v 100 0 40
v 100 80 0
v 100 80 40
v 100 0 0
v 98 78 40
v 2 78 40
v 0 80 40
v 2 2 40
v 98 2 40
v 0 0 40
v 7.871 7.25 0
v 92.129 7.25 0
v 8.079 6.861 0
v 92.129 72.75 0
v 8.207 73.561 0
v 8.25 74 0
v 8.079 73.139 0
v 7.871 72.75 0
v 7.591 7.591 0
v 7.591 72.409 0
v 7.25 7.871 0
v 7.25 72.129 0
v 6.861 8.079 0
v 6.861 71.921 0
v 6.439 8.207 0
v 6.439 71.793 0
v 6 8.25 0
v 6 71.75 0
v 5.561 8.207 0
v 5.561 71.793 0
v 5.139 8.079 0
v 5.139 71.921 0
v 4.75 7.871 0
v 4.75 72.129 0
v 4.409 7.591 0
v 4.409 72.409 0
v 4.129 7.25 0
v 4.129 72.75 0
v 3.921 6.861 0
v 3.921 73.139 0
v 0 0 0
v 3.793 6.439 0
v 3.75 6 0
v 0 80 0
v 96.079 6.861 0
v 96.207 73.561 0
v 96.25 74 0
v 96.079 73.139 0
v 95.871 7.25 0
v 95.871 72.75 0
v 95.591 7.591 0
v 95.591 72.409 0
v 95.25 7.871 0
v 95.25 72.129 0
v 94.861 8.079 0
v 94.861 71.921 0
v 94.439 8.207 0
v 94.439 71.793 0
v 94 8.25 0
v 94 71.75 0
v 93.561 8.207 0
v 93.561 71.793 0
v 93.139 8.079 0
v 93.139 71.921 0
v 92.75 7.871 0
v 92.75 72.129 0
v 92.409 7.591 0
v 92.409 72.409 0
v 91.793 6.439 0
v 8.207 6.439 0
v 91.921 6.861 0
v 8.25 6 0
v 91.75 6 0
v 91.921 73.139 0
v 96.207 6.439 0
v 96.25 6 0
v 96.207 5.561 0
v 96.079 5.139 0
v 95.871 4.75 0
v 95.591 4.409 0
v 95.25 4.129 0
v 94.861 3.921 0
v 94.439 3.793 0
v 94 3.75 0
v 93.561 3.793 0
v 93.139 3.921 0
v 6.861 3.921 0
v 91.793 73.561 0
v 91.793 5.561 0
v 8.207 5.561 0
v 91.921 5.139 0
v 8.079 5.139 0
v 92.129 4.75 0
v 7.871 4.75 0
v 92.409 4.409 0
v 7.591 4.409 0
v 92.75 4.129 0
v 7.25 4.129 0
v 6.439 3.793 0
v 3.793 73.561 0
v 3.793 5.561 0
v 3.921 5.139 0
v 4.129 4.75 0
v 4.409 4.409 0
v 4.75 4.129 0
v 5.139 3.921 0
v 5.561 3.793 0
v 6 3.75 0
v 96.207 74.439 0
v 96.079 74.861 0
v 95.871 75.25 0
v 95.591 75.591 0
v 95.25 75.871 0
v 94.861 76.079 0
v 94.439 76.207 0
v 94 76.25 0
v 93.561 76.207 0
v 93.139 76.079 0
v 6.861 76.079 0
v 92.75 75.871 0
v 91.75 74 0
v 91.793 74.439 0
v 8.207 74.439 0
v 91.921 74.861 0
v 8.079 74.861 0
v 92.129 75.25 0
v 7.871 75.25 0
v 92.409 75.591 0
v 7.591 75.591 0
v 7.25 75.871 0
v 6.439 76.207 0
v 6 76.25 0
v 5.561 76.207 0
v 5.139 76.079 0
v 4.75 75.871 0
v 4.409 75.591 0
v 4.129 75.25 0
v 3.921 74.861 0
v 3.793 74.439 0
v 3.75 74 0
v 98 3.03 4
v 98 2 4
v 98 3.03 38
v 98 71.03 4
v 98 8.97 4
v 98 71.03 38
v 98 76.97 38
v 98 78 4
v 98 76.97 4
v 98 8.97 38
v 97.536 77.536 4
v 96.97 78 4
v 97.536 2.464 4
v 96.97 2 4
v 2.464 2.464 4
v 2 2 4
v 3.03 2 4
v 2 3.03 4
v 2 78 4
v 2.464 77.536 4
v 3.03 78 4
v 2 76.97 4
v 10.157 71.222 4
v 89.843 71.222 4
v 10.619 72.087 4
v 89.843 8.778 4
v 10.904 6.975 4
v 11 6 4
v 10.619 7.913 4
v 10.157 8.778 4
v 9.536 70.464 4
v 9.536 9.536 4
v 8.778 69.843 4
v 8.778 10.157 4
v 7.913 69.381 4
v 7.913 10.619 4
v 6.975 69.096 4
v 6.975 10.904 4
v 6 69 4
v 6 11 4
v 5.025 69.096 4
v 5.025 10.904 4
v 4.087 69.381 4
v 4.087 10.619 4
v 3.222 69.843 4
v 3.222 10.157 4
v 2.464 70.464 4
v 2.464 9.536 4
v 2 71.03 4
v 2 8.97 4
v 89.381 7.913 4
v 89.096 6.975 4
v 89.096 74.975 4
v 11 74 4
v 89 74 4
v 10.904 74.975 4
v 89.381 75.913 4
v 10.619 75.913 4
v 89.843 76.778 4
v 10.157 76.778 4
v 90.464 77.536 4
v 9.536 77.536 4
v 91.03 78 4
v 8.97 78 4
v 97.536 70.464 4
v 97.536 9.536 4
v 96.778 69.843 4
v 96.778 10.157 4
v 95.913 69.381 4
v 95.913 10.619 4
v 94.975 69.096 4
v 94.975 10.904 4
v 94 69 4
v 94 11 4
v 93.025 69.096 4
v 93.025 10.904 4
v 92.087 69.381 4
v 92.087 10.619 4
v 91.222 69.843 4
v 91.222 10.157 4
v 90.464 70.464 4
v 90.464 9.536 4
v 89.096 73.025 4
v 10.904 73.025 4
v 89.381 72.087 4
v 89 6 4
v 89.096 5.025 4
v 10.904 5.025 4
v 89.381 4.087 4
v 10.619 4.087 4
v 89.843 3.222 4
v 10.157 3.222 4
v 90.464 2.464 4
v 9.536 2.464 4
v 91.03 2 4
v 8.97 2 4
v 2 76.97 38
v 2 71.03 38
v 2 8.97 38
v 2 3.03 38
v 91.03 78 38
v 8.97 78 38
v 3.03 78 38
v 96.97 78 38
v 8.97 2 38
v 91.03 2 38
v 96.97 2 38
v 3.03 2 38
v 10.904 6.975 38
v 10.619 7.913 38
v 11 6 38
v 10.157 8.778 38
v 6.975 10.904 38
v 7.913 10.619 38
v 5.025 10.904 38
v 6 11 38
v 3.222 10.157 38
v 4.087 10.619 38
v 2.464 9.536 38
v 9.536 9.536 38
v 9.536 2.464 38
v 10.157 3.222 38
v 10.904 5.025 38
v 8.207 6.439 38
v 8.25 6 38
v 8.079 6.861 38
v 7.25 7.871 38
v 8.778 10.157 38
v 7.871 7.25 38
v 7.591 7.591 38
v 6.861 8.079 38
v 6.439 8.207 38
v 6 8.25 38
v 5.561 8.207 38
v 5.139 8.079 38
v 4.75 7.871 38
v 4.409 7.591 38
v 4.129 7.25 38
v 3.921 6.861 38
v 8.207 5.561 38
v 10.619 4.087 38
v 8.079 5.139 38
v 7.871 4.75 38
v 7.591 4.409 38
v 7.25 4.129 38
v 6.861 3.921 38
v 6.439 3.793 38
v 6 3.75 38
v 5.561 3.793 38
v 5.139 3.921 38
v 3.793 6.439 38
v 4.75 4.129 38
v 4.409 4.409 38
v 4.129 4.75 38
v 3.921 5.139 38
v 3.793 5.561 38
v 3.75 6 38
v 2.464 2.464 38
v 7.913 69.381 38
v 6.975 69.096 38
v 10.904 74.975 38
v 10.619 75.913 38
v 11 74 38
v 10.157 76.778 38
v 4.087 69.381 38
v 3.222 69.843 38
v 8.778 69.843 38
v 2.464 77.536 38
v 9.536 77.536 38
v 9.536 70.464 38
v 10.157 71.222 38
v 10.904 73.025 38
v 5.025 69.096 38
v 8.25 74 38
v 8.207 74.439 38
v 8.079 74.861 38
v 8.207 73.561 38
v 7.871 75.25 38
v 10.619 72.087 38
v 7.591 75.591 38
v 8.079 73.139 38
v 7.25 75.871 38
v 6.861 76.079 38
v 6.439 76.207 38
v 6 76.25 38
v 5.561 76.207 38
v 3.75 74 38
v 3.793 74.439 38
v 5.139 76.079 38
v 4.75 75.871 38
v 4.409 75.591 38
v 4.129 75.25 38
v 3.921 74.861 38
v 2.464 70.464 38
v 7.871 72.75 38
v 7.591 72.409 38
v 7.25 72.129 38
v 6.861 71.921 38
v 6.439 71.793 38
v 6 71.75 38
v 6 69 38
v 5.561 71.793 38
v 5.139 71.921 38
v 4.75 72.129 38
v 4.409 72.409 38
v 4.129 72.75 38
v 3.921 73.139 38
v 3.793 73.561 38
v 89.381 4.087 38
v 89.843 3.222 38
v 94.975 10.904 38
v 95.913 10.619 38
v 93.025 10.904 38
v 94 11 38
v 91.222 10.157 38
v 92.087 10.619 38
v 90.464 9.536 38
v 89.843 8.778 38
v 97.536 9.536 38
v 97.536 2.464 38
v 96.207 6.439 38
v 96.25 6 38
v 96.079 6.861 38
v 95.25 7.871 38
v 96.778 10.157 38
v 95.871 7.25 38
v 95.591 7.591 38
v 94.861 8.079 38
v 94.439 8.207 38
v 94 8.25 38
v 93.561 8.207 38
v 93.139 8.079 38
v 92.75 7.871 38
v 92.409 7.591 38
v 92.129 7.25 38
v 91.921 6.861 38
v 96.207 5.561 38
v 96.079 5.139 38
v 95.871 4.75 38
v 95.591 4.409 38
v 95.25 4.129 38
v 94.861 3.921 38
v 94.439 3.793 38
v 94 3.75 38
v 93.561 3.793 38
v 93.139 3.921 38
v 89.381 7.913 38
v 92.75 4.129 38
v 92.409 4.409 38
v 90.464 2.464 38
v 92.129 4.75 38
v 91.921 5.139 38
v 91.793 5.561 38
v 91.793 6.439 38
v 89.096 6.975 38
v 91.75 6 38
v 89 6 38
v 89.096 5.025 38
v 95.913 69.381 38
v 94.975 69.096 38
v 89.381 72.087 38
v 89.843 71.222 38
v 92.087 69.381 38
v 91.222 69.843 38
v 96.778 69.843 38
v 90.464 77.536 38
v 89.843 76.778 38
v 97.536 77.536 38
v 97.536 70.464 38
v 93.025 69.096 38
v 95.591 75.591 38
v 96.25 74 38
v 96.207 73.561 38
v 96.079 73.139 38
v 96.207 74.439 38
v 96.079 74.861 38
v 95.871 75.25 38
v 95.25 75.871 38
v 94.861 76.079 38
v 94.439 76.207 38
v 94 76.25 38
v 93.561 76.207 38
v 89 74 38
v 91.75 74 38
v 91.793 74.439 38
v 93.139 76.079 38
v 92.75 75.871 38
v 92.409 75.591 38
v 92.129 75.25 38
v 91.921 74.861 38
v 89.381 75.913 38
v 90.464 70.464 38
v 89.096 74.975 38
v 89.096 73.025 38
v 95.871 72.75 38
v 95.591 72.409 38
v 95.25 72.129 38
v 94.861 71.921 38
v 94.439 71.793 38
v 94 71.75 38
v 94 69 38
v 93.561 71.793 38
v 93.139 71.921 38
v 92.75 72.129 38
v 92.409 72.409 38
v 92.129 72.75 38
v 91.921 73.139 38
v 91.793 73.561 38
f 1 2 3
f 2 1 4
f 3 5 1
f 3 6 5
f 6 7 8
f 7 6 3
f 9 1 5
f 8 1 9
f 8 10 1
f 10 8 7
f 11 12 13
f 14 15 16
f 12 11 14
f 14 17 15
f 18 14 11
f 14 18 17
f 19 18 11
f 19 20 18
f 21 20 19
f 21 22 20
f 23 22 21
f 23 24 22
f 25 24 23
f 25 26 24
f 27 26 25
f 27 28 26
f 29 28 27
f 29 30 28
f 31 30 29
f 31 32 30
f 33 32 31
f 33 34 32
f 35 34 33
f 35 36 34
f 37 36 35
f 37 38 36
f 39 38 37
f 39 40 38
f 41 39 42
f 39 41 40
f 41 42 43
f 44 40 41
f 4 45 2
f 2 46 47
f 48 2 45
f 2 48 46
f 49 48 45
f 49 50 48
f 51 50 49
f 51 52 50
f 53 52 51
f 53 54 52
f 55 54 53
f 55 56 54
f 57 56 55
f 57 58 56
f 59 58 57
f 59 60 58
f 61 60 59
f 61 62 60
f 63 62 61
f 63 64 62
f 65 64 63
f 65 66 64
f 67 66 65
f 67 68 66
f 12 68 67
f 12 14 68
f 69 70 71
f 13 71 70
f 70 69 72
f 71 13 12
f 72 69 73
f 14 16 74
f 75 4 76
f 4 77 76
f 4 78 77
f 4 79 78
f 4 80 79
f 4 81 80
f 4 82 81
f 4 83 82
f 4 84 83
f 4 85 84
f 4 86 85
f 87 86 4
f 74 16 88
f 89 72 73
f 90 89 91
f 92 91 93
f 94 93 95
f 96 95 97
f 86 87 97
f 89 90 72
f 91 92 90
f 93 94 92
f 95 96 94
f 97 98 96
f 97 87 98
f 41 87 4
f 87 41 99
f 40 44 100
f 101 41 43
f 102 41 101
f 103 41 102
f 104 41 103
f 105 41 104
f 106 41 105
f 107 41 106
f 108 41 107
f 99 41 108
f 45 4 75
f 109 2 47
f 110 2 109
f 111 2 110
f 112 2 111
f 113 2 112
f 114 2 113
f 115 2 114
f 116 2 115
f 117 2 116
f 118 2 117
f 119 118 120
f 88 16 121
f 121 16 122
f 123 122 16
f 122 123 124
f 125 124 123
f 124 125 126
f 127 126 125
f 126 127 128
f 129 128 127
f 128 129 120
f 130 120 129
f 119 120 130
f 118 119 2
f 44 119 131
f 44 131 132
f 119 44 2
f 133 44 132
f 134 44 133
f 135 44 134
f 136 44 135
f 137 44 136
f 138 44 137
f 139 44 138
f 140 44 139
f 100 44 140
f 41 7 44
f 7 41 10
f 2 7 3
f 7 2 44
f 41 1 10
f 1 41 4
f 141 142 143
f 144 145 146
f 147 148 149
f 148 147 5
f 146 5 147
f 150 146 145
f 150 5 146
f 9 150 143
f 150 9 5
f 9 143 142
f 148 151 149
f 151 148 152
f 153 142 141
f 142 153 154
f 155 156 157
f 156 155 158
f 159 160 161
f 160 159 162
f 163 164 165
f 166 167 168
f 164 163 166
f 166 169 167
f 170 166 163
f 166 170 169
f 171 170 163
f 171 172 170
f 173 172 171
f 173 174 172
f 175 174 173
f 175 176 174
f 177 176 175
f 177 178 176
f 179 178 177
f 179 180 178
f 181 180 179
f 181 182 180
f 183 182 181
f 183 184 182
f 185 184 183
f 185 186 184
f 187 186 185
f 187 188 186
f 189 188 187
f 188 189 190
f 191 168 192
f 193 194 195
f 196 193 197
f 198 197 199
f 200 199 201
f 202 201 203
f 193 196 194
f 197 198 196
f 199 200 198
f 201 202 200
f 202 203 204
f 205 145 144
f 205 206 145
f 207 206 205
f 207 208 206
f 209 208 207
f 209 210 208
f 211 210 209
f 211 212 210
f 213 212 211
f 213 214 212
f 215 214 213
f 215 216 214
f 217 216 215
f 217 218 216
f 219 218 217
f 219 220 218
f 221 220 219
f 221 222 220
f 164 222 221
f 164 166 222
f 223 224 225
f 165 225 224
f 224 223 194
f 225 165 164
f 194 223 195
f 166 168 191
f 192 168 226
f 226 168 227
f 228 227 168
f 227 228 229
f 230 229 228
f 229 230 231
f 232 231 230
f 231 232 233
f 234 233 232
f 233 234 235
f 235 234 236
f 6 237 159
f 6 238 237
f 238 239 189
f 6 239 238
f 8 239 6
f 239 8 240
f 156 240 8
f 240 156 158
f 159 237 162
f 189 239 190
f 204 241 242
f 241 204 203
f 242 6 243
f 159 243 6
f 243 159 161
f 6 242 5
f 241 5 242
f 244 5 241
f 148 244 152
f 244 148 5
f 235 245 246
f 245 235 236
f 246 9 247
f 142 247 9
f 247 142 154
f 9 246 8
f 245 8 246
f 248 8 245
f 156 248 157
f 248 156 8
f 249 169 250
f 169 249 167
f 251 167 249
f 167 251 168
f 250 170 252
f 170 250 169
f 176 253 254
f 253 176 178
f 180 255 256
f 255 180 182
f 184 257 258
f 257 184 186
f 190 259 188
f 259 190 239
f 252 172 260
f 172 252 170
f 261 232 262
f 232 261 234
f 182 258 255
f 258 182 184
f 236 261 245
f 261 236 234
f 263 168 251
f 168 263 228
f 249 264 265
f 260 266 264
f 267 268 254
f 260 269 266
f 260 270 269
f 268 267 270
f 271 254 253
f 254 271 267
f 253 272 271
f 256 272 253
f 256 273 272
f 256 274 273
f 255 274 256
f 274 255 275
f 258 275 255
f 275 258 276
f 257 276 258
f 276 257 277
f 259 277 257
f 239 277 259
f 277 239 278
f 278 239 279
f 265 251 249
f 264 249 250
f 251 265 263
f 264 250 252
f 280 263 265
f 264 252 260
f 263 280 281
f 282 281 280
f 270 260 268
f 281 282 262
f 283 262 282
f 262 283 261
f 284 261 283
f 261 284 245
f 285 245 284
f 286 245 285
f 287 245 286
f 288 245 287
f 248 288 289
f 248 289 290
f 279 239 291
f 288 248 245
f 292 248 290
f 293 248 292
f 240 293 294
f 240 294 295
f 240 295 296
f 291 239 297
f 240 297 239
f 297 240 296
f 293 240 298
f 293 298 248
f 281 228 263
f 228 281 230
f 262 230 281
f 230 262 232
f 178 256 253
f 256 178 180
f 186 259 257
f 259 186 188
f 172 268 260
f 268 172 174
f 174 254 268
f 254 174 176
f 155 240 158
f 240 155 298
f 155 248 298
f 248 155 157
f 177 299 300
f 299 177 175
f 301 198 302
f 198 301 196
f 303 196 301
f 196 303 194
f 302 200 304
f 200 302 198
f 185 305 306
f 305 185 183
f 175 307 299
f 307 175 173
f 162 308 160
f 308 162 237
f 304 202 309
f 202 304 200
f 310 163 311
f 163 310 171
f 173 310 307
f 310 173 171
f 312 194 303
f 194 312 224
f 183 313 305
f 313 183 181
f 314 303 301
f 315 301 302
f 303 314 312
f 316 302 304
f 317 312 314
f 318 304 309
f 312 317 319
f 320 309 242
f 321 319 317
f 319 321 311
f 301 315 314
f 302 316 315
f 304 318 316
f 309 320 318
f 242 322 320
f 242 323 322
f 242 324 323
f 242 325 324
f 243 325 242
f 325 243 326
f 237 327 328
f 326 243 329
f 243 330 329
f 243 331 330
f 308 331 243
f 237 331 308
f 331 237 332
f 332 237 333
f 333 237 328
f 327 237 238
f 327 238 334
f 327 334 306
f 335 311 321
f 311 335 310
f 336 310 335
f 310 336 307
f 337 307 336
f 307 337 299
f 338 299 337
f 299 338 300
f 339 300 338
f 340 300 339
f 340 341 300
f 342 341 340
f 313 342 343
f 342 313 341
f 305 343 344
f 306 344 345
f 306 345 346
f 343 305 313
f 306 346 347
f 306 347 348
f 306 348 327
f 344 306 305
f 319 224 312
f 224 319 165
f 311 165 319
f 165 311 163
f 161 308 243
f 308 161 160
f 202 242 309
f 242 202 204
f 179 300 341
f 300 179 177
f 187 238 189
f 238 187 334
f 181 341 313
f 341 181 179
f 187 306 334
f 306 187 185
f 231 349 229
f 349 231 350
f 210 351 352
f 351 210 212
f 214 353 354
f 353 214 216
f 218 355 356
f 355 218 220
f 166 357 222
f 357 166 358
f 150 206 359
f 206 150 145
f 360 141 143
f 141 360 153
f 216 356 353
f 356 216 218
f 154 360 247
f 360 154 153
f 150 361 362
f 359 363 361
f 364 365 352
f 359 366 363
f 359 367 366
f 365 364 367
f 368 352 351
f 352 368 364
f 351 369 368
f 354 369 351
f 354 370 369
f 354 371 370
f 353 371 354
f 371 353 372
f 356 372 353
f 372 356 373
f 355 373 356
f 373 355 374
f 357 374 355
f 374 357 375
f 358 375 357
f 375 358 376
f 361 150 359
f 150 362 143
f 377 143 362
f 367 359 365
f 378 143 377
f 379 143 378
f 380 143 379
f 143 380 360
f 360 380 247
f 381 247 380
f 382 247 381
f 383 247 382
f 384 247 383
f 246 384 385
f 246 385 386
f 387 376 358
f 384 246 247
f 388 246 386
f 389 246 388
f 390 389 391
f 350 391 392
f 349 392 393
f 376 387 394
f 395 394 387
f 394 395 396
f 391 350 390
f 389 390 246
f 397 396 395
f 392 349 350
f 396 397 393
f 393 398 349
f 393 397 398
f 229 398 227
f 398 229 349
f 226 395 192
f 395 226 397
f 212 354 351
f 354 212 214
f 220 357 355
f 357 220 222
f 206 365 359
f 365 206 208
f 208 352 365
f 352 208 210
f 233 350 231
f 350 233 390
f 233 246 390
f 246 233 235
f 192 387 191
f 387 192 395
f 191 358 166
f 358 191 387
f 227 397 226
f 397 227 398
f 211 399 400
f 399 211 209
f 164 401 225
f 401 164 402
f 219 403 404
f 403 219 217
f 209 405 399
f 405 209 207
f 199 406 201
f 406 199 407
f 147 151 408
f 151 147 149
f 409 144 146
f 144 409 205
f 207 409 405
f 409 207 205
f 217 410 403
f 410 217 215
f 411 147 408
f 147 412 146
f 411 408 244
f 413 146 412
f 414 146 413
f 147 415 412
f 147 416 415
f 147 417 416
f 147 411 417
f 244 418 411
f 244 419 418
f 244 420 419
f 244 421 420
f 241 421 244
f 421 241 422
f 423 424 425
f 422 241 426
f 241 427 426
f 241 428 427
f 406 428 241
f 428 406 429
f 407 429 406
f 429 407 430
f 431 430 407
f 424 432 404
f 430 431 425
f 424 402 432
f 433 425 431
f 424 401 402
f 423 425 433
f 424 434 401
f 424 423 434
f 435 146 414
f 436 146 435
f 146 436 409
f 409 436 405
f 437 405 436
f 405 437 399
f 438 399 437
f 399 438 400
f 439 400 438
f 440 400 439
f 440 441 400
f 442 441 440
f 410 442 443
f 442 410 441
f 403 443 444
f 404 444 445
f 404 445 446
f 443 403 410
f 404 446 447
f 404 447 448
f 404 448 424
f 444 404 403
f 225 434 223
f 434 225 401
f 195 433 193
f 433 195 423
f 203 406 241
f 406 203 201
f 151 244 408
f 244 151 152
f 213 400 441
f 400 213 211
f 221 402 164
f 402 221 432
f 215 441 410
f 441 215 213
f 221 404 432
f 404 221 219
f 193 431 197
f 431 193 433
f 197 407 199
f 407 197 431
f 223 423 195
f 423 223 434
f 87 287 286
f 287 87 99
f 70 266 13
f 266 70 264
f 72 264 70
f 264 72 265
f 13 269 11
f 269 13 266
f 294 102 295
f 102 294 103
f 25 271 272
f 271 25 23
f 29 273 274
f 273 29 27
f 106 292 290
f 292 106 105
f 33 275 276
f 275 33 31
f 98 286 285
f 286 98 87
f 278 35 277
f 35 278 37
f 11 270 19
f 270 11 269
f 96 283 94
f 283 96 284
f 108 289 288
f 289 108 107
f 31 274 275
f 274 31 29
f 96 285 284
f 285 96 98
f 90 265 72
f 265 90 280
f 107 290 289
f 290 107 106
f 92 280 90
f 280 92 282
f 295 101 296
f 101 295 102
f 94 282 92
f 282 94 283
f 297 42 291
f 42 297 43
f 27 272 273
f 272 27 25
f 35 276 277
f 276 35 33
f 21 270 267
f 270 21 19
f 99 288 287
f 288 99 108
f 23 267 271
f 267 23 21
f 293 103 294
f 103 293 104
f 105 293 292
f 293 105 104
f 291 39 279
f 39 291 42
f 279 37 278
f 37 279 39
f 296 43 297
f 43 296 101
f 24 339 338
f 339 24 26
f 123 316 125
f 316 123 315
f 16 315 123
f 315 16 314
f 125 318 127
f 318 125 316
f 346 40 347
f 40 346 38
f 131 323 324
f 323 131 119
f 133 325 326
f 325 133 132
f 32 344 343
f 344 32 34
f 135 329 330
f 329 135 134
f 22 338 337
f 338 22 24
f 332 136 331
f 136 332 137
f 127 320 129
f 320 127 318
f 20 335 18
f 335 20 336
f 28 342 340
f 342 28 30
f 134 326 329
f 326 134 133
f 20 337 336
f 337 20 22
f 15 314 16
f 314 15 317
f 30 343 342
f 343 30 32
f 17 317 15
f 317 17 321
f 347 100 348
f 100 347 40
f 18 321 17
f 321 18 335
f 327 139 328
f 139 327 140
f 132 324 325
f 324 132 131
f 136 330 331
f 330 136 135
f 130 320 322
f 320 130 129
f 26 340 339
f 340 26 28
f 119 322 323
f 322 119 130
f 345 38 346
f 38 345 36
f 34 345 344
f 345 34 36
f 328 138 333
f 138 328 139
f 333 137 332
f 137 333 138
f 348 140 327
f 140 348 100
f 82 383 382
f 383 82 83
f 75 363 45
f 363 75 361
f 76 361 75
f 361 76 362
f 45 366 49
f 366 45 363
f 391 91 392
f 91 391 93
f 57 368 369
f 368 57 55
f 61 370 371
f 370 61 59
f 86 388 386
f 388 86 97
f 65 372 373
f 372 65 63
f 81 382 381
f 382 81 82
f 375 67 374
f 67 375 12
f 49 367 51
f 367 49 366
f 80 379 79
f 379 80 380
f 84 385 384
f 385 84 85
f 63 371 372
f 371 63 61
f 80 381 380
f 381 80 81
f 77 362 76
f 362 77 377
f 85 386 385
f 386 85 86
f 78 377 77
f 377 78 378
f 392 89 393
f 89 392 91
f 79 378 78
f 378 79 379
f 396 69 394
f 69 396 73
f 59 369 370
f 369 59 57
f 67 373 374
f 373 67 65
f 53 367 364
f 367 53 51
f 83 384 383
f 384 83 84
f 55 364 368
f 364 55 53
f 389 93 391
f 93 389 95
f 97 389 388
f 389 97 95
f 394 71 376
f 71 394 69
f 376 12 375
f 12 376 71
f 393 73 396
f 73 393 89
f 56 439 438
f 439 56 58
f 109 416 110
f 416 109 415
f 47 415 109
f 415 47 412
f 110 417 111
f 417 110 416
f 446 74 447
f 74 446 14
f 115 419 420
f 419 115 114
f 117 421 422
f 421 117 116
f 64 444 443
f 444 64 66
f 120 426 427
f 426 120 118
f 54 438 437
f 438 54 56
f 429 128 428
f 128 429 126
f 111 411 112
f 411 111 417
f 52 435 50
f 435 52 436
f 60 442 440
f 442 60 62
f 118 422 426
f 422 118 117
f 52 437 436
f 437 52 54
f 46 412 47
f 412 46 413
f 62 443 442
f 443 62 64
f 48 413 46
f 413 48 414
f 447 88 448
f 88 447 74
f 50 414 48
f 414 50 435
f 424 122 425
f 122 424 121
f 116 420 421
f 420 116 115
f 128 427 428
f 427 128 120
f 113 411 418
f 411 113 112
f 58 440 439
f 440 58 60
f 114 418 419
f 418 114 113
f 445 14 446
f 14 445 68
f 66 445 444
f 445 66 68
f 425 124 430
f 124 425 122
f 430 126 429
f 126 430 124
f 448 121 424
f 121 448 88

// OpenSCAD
$fn = 32;

// ----------------------------------------------------------------------
// Enclosure body: 100 x 80 x 40 mm, wall 2 mm
// ----------------------------------------------------------------------

// --- parameters (mm) ---
length = 100;             // outside length, X
width = 80;               // outside width, Y
height = 40;              // outside height, Z
wall = 2;                 // side wall thickness
floor_t = 4;              // floor thickness
boss_d = 10;              // corner boss diameter
boss_h = 34;              // corner boss height above the floor
boss_hole_d = 4.5;        // lid screw clearance in the boss
boss_lip = 6;             // boss centre inset from the corner

module shell() {
  difference() {
    cube([length, width, height]);
    /* hollow, open at the top */
    translate([wall, wall, floor_t])
      cube([length - 2 * wall, width - 2 * wall, height]);
  }
}

module bosses() {
  /* corner bosses, sunk 1 mm into the floor */
  for (sx = [0, 1]) for (sy = [0, 1])
    translate([sx * (length - 2 * boss_lip) + boss_lip, sy * (width - 2 * boss_lip) + boss_lip, floor_t - 1])
      cylinder(h = boss_h + 1, d = boss_d);
}

difference() {
  union() {
    shell();
    bosses();
  }
  /* boss screw holes */
  for (sx = [0, 1]) for (sy = [0, 1])
    translate([sx * (length - 2 * boss_lip) + boss_lip, sy * (width - 2 * boss_lip) + boss_lip, -1]) cylinder(h = floor_t + boss_h + 2, d = boss_hole_d);
}
